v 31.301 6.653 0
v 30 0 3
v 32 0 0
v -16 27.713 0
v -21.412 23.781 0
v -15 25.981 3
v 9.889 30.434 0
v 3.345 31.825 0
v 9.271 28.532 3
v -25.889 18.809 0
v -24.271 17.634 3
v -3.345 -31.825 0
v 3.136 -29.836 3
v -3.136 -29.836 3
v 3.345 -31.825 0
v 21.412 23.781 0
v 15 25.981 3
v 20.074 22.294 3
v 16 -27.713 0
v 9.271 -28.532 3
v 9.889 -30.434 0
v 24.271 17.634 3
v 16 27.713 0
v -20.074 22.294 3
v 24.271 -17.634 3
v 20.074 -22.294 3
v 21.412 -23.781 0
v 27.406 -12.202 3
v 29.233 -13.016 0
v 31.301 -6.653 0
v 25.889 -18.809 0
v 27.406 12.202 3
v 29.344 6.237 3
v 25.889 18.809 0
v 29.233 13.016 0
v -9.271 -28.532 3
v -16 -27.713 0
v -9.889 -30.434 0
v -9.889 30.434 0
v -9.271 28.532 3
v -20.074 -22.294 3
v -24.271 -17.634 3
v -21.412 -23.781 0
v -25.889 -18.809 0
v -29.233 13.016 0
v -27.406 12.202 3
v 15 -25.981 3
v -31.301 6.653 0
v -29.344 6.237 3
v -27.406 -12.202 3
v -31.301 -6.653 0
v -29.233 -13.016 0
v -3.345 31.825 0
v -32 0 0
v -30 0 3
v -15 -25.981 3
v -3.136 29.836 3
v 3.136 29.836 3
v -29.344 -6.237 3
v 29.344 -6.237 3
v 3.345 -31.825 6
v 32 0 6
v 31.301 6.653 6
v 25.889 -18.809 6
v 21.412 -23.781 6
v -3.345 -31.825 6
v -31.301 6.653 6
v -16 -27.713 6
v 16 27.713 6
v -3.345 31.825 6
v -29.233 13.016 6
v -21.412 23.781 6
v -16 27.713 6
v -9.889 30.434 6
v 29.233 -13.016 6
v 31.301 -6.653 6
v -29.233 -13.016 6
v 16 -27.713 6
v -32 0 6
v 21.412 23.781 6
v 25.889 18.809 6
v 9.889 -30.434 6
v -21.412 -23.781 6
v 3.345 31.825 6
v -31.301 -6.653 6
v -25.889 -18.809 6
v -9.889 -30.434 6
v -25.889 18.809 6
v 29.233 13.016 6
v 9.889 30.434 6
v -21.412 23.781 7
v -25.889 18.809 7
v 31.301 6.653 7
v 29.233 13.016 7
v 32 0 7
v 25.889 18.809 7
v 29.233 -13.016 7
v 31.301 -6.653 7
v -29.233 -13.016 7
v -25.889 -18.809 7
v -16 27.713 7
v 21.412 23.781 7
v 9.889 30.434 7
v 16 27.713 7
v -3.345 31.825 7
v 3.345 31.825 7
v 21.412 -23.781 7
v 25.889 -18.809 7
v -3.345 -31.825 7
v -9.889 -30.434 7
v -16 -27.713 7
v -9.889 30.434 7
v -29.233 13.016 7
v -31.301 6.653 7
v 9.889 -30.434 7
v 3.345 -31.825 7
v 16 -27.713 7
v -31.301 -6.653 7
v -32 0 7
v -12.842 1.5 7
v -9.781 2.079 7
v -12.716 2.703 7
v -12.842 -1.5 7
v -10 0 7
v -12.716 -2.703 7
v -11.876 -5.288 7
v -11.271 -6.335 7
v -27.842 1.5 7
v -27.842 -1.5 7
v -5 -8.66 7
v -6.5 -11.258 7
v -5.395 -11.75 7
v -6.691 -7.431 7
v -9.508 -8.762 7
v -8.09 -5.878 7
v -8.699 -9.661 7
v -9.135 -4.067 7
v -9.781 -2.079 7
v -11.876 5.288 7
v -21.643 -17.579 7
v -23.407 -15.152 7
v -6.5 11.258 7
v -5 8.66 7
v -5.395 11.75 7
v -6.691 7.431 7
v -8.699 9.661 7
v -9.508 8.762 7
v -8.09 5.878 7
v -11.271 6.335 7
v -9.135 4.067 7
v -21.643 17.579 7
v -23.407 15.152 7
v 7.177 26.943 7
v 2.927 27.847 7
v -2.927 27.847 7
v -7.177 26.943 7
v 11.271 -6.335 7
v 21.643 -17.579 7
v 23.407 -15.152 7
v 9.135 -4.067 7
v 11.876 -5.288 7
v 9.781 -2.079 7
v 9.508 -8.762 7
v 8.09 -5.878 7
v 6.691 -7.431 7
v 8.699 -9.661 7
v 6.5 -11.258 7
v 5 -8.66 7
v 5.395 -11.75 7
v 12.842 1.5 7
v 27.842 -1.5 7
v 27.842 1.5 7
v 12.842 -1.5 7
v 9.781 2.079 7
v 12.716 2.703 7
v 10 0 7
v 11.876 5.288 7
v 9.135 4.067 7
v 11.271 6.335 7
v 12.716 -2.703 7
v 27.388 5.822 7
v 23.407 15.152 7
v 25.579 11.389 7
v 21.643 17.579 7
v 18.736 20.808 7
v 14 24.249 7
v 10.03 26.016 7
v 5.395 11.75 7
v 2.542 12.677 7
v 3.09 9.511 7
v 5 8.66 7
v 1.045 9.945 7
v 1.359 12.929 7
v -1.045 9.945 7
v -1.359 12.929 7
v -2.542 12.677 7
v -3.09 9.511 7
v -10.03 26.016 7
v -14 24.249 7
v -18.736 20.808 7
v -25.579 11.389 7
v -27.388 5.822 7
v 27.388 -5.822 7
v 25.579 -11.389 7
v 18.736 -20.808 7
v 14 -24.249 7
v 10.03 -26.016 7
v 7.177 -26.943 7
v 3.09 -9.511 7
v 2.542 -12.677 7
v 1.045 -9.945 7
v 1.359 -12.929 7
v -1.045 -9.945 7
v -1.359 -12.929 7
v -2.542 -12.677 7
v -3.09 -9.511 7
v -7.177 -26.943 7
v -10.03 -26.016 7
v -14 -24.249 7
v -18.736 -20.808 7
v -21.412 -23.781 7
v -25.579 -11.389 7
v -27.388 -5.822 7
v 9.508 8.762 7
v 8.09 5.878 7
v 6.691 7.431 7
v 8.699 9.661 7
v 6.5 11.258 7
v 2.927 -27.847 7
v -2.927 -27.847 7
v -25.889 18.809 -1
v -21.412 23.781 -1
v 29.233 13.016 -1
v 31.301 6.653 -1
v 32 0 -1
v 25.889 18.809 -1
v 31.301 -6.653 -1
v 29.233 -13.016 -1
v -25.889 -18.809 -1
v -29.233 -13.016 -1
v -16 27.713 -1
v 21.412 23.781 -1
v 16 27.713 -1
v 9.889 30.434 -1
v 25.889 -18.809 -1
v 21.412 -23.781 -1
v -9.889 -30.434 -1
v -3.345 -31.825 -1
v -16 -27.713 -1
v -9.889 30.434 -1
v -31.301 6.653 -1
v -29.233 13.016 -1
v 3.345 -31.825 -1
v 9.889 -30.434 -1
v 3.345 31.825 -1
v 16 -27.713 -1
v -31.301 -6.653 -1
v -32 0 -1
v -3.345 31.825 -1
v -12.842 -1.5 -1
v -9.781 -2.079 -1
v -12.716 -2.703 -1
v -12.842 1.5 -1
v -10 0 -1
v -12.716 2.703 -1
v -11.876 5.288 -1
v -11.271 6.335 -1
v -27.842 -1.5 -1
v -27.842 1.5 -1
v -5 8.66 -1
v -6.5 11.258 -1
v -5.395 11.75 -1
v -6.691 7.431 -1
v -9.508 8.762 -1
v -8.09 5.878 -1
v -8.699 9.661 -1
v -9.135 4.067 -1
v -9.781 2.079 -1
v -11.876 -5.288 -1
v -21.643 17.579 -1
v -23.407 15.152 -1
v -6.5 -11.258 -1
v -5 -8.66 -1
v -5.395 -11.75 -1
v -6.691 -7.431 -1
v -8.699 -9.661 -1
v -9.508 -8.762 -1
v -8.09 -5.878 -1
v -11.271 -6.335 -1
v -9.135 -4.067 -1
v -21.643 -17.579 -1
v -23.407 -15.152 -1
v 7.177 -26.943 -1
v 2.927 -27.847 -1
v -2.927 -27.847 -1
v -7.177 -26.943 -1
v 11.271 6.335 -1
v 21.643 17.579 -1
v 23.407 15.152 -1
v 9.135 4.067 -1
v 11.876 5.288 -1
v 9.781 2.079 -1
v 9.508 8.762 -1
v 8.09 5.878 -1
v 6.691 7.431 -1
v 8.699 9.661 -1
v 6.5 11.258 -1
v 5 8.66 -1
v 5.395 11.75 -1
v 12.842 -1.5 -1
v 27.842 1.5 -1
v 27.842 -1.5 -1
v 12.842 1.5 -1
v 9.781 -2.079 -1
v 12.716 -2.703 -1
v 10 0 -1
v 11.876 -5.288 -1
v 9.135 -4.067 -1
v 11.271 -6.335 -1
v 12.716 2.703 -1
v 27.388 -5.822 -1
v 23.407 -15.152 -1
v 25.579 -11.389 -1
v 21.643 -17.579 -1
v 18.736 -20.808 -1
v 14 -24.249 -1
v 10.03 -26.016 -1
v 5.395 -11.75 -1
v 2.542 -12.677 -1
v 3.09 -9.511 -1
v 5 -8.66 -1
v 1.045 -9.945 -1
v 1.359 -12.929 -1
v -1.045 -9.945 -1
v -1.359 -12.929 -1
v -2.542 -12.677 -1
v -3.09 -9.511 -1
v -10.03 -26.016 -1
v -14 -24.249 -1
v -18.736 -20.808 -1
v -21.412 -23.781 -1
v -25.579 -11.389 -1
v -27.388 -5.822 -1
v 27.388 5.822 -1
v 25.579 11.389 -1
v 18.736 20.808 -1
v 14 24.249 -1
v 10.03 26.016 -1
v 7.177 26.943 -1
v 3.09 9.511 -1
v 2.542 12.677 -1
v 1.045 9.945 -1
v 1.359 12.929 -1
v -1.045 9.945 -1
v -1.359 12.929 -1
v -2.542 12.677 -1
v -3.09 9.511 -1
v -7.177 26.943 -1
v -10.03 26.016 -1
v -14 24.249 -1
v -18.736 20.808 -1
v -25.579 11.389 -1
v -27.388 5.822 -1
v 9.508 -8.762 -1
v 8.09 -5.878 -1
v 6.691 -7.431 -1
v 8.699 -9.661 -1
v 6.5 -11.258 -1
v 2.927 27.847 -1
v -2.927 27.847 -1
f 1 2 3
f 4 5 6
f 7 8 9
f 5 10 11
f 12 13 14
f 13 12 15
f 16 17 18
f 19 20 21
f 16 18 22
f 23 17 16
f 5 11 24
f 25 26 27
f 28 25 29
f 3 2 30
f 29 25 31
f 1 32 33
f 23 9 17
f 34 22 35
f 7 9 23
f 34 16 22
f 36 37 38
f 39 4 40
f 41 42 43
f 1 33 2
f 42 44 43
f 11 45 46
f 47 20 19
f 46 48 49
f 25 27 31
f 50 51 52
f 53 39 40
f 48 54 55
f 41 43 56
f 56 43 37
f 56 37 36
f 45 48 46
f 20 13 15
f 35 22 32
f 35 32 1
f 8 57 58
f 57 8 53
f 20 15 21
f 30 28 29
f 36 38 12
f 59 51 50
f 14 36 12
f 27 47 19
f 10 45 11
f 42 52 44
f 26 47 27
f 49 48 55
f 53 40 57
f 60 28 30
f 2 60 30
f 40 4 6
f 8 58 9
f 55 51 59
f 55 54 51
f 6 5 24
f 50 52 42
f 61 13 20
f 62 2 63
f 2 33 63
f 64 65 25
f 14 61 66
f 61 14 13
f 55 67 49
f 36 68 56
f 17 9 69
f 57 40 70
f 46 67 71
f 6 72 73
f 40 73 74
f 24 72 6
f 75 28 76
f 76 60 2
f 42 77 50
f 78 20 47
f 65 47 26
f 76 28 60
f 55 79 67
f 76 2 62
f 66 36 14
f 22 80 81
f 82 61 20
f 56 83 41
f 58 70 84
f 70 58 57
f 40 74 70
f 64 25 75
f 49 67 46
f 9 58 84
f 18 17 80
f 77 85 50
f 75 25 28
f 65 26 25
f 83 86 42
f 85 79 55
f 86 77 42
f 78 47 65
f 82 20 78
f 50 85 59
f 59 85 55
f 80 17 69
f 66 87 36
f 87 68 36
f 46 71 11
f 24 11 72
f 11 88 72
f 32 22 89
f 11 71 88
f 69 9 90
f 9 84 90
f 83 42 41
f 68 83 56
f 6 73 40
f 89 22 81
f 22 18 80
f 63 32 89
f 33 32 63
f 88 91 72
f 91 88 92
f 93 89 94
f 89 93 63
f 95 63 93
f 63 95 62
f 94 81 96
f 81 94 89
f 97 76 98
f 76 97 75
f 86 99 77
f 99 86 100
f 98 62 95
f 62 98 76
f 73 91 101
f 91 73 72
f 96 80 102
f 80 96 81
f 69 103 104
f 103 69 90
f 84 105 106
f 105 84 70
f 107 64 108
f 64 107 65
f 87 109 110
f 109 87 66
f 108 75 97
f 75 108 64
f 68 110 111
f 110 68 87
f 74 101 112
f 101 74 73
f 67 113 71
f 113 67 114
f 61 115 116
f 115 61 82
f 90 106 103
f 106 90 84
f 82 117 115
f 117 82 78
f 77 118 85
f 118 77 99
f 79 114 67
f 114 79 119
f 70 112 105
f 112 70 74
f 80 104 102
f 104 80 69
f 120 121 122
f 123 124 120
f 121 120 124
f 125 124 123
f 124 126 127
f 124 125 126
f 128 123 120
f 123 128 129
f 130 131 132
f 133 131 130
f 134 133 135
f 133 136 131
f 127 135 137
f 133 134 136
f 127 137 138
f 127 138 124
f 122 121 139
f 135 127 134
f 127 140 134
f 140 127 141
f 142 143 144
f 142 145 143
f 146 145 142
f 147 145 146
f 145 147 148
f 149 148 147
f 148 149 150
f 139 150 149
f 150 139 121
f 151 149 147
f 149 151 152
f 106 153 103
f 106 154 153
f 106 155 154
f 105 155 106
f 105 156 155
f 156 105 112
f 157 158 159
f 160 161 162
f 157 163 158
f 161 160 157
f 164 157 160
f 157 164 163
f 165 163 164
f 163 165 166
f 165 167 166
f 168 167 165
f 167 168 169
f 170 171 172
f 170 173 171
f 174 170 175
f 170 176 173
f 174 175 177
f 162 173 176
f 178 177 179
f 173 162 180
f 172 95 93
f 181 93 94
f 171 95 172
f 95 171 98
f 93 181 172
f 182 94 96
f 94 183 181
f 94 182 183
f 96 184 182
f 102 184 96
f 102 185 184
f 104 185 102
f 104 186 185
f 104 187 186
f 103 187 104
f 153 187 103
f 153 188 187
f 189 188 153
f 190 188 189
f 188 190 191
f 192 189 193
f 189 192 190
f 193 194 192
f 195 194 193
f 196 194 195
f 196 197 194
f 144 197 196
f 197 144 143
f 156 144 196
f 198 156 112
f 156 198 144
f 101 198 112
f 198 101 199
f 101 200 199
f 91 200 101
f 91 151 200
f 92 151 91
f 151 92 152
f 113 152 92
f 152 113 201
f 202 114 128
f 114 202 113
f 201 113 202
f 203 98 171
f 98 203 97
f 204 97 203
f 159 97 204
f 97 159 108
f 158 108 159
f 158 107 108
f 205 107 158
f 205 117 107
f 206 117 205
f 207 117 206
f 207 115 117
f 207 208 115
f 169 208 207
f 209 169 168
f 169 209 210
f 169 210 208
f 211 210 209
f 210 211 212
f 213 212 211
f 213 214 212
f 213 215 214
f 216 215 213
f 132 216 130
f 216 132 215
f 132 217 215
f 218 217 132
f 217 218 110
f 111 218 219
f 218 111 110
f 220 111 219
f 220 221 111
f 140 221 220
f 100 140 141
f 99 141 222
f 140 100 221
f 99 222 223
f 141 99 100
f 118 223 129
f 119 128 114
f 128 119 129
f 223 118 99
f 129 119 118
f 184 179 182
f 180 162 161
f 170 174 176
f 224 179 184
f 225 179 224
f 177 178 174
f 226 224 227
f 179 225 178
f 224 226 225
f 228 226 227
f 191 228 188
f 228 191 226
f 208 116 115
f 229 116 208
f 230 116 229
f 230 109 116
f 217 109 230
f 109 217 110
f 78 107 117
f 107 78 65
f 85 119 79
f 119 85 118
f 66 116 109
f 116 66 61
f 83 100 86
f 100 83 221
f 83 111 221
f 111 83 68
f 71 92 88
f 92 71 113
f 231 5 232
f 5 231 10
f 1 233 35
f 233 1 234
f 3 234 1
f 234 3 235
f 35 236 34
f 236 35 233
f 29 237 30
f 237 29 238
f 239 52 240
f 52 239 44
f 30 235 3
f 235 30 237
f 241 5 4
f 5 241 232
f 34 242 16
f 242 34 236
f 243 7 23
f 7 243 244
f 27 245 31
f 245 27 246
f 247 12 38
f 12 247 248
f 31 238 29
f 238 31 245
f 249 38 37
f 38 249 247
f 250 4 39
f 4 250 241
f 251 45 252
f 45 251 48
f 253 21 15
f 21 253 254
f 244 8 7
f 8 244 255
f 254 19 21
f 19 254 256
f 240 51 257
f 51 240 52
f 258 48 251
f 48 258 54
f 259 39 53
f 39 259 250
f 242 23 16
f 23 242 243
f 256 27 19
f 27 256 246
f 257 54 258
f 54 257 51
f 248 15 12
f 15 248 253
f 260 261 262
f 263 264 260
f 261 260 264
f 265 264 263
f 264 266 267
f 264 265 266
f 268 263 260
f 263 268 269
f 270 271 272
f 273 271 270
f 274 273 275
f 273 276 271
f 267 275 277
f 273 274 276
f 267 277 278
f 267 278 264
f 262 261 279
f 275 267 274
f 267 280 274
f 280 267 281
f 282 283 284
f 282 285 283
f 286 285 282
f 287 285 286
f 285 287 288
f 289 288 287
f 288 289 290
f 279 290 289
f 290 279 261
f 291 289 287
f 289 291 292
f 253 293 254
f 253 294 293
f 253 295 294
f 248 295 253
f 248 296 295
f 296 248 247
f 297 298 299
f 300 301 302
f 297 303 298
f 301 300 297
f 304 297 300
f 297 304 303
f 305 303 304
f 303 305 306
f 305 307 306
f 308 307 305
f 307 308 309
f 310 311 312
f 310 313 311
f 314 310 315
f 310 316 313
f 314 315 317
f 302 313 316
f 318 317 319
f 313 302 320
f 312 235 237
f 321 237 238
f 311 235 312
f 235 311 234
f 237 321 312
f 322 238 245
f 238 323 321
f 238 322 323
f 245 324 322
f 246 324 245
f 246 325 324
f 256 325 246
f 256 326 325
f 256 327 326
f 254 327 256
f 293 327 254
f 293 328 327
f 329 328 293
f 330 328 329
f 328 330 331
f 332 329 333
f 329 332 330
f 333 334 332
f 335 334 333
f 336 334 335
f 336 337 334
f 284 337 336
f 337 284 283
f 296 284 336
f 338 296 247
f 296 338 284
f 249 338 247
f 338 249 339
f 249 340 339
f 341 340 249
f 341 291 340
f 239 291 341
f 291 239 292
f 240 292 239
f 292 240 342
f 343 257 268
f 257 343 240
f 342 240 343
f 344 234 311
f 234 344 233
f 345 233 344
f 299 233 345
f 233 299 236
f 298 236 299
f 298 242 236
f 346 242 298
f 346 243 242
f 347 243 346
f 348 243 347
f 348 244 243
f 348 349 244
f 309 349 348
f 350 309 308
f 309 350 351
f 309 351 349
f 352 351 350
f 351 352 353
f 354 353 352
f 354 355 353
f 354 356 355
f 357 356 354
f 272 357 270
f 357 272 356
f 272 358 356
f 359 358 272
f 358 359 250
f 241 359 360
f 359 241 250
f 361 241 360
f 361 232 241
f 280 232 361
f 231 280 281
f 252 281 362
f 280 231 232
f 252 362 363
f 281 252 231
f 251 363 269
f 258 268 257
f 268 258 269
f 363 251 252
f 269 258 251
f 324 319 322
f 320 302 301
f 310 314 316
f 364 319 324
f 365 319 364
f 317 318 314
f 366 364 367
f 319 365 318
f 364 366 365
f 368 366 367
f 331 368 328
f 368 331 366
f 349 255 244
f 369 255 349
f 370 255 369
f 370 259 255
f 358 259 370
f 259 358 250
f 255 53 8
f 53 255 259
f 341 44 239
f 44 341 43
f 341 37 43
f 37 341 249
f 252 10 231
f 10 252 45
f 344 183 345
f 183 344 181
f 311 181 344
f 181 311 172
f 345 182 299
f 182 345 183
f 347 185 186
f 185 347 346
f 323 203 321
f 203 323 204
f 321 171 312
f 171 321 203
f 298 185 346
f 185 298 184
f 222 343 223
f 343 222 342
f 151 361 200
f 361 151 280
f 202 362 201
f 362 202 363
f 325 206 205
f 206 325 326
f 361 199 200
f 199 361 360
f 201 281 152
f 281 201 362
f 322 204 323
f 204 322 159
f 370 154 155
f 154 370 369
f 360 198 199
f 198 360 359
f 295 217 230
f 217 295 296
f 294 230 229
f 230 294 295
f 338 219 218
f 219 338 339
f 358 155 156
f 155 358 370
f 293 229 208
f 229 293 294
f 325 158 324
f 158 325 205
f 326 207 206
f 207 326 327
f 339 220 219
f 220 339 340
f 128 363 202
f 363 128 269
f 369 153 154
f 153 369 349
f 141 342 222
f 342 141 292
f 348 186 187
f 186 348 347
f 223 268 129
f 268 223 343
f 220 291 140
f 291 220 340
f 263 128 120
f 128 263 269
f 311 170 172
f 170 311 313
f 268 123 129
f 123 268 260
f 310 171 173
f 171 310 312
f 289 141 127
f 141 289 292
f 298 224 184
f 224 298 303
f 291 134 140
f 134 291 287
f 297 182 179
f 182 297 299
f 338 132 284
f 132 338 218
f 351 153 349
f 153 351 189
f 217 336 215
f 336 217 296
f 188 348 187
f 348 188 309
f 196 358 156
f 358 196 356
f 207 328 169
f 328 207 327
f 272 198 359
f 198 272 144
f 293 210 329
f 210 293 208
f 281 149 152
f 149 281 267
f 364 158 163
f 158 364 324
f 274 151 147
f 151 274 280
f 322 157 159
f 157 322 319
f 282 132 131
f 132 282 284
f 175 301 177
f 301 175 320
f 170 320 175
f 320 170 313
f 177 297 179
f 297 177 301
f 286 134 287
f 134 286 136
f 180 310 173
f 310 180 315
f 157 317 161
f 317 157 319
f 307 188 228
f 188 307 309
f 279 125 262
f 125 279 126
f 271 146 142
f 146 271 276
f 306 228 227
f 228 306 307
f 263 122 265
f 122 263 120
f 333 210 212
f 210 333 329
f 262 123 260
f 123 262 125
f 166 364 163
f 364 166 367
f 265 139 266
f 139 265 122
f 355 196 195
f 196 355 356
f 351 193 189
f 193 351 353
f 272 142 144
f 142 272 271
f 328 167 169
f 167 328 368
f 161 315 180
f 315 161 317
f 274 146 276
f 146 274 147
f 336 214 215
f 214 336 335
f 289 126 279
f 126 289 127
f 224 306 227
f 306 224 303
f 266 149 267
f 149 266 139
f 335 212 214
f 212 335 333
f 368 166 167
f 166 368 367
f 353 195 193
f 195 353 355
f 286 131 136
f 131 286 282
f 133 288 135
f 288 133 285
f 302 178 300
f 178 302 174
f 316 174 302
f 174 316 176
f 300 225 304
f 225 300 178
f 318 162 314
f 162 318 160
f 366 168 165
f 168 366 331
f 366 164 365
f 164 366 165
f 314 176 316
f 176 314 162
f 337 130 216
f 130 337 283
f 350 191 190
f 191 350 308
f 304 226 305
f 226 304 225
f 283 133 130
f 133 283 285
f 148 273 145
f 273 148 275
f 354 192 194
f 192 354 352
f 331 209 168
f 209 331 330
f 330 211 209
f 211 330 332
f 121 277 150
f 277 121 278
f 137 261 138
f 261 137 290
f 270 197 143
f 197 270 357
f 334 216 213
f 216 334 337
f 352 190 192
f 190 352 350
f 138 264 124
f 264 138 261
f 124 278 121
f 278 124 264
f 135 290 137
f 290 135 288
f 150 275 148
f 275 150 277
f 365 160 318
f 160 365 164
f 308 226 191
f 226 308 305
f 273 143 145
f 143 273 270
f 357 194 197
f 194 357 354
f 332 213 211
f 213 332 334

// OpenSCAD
// rod wheels driven by stepper motor

// Lab Pulley by Mark Schober <jmschober@gmail.com> 2017
// Additional use details at modelingscience.org
// This work is licensed under a Creative Commons Attribution-ShareAlike 4.0 International License
// Designed such that 1 unit = 1/32"
// 2" diameter pulley to fit on a 5/8" bearing (R4zz) with a 1/4" shaft (such as a 1/4" bolt)
// Scale diameter to 2" or 50.8mm in slicer software

module disk(){
cylinder(3,32,30);
translate([0,0,3])
    cylinder(3,30,32);
    translate([0,0,6])cylinder(1,32,32);
    translate([0,0,-1])cylinder(1,32,32);    
}

module rim(){
    difference(){
        disk();
    translate([0,0,-3])
    cylinder(20,28,28);
    }
} 

module spokes(){
for (x = [0:36:144]){
    rotate([0,0,x])translate([-29.5,-1.5,-1])cube([59,3,8]);
  }
}

module spokedwheel(){
    rim();
    spokes();
    translate([0,0,-1])cylinder(8,13,13); 
}

difference(){
spokedwheel();
    translate([0,0,-2])cylinder(11,10,10);
//    translate([0,0,-2])cylinder(10,8,8,$fn=100); 
}
